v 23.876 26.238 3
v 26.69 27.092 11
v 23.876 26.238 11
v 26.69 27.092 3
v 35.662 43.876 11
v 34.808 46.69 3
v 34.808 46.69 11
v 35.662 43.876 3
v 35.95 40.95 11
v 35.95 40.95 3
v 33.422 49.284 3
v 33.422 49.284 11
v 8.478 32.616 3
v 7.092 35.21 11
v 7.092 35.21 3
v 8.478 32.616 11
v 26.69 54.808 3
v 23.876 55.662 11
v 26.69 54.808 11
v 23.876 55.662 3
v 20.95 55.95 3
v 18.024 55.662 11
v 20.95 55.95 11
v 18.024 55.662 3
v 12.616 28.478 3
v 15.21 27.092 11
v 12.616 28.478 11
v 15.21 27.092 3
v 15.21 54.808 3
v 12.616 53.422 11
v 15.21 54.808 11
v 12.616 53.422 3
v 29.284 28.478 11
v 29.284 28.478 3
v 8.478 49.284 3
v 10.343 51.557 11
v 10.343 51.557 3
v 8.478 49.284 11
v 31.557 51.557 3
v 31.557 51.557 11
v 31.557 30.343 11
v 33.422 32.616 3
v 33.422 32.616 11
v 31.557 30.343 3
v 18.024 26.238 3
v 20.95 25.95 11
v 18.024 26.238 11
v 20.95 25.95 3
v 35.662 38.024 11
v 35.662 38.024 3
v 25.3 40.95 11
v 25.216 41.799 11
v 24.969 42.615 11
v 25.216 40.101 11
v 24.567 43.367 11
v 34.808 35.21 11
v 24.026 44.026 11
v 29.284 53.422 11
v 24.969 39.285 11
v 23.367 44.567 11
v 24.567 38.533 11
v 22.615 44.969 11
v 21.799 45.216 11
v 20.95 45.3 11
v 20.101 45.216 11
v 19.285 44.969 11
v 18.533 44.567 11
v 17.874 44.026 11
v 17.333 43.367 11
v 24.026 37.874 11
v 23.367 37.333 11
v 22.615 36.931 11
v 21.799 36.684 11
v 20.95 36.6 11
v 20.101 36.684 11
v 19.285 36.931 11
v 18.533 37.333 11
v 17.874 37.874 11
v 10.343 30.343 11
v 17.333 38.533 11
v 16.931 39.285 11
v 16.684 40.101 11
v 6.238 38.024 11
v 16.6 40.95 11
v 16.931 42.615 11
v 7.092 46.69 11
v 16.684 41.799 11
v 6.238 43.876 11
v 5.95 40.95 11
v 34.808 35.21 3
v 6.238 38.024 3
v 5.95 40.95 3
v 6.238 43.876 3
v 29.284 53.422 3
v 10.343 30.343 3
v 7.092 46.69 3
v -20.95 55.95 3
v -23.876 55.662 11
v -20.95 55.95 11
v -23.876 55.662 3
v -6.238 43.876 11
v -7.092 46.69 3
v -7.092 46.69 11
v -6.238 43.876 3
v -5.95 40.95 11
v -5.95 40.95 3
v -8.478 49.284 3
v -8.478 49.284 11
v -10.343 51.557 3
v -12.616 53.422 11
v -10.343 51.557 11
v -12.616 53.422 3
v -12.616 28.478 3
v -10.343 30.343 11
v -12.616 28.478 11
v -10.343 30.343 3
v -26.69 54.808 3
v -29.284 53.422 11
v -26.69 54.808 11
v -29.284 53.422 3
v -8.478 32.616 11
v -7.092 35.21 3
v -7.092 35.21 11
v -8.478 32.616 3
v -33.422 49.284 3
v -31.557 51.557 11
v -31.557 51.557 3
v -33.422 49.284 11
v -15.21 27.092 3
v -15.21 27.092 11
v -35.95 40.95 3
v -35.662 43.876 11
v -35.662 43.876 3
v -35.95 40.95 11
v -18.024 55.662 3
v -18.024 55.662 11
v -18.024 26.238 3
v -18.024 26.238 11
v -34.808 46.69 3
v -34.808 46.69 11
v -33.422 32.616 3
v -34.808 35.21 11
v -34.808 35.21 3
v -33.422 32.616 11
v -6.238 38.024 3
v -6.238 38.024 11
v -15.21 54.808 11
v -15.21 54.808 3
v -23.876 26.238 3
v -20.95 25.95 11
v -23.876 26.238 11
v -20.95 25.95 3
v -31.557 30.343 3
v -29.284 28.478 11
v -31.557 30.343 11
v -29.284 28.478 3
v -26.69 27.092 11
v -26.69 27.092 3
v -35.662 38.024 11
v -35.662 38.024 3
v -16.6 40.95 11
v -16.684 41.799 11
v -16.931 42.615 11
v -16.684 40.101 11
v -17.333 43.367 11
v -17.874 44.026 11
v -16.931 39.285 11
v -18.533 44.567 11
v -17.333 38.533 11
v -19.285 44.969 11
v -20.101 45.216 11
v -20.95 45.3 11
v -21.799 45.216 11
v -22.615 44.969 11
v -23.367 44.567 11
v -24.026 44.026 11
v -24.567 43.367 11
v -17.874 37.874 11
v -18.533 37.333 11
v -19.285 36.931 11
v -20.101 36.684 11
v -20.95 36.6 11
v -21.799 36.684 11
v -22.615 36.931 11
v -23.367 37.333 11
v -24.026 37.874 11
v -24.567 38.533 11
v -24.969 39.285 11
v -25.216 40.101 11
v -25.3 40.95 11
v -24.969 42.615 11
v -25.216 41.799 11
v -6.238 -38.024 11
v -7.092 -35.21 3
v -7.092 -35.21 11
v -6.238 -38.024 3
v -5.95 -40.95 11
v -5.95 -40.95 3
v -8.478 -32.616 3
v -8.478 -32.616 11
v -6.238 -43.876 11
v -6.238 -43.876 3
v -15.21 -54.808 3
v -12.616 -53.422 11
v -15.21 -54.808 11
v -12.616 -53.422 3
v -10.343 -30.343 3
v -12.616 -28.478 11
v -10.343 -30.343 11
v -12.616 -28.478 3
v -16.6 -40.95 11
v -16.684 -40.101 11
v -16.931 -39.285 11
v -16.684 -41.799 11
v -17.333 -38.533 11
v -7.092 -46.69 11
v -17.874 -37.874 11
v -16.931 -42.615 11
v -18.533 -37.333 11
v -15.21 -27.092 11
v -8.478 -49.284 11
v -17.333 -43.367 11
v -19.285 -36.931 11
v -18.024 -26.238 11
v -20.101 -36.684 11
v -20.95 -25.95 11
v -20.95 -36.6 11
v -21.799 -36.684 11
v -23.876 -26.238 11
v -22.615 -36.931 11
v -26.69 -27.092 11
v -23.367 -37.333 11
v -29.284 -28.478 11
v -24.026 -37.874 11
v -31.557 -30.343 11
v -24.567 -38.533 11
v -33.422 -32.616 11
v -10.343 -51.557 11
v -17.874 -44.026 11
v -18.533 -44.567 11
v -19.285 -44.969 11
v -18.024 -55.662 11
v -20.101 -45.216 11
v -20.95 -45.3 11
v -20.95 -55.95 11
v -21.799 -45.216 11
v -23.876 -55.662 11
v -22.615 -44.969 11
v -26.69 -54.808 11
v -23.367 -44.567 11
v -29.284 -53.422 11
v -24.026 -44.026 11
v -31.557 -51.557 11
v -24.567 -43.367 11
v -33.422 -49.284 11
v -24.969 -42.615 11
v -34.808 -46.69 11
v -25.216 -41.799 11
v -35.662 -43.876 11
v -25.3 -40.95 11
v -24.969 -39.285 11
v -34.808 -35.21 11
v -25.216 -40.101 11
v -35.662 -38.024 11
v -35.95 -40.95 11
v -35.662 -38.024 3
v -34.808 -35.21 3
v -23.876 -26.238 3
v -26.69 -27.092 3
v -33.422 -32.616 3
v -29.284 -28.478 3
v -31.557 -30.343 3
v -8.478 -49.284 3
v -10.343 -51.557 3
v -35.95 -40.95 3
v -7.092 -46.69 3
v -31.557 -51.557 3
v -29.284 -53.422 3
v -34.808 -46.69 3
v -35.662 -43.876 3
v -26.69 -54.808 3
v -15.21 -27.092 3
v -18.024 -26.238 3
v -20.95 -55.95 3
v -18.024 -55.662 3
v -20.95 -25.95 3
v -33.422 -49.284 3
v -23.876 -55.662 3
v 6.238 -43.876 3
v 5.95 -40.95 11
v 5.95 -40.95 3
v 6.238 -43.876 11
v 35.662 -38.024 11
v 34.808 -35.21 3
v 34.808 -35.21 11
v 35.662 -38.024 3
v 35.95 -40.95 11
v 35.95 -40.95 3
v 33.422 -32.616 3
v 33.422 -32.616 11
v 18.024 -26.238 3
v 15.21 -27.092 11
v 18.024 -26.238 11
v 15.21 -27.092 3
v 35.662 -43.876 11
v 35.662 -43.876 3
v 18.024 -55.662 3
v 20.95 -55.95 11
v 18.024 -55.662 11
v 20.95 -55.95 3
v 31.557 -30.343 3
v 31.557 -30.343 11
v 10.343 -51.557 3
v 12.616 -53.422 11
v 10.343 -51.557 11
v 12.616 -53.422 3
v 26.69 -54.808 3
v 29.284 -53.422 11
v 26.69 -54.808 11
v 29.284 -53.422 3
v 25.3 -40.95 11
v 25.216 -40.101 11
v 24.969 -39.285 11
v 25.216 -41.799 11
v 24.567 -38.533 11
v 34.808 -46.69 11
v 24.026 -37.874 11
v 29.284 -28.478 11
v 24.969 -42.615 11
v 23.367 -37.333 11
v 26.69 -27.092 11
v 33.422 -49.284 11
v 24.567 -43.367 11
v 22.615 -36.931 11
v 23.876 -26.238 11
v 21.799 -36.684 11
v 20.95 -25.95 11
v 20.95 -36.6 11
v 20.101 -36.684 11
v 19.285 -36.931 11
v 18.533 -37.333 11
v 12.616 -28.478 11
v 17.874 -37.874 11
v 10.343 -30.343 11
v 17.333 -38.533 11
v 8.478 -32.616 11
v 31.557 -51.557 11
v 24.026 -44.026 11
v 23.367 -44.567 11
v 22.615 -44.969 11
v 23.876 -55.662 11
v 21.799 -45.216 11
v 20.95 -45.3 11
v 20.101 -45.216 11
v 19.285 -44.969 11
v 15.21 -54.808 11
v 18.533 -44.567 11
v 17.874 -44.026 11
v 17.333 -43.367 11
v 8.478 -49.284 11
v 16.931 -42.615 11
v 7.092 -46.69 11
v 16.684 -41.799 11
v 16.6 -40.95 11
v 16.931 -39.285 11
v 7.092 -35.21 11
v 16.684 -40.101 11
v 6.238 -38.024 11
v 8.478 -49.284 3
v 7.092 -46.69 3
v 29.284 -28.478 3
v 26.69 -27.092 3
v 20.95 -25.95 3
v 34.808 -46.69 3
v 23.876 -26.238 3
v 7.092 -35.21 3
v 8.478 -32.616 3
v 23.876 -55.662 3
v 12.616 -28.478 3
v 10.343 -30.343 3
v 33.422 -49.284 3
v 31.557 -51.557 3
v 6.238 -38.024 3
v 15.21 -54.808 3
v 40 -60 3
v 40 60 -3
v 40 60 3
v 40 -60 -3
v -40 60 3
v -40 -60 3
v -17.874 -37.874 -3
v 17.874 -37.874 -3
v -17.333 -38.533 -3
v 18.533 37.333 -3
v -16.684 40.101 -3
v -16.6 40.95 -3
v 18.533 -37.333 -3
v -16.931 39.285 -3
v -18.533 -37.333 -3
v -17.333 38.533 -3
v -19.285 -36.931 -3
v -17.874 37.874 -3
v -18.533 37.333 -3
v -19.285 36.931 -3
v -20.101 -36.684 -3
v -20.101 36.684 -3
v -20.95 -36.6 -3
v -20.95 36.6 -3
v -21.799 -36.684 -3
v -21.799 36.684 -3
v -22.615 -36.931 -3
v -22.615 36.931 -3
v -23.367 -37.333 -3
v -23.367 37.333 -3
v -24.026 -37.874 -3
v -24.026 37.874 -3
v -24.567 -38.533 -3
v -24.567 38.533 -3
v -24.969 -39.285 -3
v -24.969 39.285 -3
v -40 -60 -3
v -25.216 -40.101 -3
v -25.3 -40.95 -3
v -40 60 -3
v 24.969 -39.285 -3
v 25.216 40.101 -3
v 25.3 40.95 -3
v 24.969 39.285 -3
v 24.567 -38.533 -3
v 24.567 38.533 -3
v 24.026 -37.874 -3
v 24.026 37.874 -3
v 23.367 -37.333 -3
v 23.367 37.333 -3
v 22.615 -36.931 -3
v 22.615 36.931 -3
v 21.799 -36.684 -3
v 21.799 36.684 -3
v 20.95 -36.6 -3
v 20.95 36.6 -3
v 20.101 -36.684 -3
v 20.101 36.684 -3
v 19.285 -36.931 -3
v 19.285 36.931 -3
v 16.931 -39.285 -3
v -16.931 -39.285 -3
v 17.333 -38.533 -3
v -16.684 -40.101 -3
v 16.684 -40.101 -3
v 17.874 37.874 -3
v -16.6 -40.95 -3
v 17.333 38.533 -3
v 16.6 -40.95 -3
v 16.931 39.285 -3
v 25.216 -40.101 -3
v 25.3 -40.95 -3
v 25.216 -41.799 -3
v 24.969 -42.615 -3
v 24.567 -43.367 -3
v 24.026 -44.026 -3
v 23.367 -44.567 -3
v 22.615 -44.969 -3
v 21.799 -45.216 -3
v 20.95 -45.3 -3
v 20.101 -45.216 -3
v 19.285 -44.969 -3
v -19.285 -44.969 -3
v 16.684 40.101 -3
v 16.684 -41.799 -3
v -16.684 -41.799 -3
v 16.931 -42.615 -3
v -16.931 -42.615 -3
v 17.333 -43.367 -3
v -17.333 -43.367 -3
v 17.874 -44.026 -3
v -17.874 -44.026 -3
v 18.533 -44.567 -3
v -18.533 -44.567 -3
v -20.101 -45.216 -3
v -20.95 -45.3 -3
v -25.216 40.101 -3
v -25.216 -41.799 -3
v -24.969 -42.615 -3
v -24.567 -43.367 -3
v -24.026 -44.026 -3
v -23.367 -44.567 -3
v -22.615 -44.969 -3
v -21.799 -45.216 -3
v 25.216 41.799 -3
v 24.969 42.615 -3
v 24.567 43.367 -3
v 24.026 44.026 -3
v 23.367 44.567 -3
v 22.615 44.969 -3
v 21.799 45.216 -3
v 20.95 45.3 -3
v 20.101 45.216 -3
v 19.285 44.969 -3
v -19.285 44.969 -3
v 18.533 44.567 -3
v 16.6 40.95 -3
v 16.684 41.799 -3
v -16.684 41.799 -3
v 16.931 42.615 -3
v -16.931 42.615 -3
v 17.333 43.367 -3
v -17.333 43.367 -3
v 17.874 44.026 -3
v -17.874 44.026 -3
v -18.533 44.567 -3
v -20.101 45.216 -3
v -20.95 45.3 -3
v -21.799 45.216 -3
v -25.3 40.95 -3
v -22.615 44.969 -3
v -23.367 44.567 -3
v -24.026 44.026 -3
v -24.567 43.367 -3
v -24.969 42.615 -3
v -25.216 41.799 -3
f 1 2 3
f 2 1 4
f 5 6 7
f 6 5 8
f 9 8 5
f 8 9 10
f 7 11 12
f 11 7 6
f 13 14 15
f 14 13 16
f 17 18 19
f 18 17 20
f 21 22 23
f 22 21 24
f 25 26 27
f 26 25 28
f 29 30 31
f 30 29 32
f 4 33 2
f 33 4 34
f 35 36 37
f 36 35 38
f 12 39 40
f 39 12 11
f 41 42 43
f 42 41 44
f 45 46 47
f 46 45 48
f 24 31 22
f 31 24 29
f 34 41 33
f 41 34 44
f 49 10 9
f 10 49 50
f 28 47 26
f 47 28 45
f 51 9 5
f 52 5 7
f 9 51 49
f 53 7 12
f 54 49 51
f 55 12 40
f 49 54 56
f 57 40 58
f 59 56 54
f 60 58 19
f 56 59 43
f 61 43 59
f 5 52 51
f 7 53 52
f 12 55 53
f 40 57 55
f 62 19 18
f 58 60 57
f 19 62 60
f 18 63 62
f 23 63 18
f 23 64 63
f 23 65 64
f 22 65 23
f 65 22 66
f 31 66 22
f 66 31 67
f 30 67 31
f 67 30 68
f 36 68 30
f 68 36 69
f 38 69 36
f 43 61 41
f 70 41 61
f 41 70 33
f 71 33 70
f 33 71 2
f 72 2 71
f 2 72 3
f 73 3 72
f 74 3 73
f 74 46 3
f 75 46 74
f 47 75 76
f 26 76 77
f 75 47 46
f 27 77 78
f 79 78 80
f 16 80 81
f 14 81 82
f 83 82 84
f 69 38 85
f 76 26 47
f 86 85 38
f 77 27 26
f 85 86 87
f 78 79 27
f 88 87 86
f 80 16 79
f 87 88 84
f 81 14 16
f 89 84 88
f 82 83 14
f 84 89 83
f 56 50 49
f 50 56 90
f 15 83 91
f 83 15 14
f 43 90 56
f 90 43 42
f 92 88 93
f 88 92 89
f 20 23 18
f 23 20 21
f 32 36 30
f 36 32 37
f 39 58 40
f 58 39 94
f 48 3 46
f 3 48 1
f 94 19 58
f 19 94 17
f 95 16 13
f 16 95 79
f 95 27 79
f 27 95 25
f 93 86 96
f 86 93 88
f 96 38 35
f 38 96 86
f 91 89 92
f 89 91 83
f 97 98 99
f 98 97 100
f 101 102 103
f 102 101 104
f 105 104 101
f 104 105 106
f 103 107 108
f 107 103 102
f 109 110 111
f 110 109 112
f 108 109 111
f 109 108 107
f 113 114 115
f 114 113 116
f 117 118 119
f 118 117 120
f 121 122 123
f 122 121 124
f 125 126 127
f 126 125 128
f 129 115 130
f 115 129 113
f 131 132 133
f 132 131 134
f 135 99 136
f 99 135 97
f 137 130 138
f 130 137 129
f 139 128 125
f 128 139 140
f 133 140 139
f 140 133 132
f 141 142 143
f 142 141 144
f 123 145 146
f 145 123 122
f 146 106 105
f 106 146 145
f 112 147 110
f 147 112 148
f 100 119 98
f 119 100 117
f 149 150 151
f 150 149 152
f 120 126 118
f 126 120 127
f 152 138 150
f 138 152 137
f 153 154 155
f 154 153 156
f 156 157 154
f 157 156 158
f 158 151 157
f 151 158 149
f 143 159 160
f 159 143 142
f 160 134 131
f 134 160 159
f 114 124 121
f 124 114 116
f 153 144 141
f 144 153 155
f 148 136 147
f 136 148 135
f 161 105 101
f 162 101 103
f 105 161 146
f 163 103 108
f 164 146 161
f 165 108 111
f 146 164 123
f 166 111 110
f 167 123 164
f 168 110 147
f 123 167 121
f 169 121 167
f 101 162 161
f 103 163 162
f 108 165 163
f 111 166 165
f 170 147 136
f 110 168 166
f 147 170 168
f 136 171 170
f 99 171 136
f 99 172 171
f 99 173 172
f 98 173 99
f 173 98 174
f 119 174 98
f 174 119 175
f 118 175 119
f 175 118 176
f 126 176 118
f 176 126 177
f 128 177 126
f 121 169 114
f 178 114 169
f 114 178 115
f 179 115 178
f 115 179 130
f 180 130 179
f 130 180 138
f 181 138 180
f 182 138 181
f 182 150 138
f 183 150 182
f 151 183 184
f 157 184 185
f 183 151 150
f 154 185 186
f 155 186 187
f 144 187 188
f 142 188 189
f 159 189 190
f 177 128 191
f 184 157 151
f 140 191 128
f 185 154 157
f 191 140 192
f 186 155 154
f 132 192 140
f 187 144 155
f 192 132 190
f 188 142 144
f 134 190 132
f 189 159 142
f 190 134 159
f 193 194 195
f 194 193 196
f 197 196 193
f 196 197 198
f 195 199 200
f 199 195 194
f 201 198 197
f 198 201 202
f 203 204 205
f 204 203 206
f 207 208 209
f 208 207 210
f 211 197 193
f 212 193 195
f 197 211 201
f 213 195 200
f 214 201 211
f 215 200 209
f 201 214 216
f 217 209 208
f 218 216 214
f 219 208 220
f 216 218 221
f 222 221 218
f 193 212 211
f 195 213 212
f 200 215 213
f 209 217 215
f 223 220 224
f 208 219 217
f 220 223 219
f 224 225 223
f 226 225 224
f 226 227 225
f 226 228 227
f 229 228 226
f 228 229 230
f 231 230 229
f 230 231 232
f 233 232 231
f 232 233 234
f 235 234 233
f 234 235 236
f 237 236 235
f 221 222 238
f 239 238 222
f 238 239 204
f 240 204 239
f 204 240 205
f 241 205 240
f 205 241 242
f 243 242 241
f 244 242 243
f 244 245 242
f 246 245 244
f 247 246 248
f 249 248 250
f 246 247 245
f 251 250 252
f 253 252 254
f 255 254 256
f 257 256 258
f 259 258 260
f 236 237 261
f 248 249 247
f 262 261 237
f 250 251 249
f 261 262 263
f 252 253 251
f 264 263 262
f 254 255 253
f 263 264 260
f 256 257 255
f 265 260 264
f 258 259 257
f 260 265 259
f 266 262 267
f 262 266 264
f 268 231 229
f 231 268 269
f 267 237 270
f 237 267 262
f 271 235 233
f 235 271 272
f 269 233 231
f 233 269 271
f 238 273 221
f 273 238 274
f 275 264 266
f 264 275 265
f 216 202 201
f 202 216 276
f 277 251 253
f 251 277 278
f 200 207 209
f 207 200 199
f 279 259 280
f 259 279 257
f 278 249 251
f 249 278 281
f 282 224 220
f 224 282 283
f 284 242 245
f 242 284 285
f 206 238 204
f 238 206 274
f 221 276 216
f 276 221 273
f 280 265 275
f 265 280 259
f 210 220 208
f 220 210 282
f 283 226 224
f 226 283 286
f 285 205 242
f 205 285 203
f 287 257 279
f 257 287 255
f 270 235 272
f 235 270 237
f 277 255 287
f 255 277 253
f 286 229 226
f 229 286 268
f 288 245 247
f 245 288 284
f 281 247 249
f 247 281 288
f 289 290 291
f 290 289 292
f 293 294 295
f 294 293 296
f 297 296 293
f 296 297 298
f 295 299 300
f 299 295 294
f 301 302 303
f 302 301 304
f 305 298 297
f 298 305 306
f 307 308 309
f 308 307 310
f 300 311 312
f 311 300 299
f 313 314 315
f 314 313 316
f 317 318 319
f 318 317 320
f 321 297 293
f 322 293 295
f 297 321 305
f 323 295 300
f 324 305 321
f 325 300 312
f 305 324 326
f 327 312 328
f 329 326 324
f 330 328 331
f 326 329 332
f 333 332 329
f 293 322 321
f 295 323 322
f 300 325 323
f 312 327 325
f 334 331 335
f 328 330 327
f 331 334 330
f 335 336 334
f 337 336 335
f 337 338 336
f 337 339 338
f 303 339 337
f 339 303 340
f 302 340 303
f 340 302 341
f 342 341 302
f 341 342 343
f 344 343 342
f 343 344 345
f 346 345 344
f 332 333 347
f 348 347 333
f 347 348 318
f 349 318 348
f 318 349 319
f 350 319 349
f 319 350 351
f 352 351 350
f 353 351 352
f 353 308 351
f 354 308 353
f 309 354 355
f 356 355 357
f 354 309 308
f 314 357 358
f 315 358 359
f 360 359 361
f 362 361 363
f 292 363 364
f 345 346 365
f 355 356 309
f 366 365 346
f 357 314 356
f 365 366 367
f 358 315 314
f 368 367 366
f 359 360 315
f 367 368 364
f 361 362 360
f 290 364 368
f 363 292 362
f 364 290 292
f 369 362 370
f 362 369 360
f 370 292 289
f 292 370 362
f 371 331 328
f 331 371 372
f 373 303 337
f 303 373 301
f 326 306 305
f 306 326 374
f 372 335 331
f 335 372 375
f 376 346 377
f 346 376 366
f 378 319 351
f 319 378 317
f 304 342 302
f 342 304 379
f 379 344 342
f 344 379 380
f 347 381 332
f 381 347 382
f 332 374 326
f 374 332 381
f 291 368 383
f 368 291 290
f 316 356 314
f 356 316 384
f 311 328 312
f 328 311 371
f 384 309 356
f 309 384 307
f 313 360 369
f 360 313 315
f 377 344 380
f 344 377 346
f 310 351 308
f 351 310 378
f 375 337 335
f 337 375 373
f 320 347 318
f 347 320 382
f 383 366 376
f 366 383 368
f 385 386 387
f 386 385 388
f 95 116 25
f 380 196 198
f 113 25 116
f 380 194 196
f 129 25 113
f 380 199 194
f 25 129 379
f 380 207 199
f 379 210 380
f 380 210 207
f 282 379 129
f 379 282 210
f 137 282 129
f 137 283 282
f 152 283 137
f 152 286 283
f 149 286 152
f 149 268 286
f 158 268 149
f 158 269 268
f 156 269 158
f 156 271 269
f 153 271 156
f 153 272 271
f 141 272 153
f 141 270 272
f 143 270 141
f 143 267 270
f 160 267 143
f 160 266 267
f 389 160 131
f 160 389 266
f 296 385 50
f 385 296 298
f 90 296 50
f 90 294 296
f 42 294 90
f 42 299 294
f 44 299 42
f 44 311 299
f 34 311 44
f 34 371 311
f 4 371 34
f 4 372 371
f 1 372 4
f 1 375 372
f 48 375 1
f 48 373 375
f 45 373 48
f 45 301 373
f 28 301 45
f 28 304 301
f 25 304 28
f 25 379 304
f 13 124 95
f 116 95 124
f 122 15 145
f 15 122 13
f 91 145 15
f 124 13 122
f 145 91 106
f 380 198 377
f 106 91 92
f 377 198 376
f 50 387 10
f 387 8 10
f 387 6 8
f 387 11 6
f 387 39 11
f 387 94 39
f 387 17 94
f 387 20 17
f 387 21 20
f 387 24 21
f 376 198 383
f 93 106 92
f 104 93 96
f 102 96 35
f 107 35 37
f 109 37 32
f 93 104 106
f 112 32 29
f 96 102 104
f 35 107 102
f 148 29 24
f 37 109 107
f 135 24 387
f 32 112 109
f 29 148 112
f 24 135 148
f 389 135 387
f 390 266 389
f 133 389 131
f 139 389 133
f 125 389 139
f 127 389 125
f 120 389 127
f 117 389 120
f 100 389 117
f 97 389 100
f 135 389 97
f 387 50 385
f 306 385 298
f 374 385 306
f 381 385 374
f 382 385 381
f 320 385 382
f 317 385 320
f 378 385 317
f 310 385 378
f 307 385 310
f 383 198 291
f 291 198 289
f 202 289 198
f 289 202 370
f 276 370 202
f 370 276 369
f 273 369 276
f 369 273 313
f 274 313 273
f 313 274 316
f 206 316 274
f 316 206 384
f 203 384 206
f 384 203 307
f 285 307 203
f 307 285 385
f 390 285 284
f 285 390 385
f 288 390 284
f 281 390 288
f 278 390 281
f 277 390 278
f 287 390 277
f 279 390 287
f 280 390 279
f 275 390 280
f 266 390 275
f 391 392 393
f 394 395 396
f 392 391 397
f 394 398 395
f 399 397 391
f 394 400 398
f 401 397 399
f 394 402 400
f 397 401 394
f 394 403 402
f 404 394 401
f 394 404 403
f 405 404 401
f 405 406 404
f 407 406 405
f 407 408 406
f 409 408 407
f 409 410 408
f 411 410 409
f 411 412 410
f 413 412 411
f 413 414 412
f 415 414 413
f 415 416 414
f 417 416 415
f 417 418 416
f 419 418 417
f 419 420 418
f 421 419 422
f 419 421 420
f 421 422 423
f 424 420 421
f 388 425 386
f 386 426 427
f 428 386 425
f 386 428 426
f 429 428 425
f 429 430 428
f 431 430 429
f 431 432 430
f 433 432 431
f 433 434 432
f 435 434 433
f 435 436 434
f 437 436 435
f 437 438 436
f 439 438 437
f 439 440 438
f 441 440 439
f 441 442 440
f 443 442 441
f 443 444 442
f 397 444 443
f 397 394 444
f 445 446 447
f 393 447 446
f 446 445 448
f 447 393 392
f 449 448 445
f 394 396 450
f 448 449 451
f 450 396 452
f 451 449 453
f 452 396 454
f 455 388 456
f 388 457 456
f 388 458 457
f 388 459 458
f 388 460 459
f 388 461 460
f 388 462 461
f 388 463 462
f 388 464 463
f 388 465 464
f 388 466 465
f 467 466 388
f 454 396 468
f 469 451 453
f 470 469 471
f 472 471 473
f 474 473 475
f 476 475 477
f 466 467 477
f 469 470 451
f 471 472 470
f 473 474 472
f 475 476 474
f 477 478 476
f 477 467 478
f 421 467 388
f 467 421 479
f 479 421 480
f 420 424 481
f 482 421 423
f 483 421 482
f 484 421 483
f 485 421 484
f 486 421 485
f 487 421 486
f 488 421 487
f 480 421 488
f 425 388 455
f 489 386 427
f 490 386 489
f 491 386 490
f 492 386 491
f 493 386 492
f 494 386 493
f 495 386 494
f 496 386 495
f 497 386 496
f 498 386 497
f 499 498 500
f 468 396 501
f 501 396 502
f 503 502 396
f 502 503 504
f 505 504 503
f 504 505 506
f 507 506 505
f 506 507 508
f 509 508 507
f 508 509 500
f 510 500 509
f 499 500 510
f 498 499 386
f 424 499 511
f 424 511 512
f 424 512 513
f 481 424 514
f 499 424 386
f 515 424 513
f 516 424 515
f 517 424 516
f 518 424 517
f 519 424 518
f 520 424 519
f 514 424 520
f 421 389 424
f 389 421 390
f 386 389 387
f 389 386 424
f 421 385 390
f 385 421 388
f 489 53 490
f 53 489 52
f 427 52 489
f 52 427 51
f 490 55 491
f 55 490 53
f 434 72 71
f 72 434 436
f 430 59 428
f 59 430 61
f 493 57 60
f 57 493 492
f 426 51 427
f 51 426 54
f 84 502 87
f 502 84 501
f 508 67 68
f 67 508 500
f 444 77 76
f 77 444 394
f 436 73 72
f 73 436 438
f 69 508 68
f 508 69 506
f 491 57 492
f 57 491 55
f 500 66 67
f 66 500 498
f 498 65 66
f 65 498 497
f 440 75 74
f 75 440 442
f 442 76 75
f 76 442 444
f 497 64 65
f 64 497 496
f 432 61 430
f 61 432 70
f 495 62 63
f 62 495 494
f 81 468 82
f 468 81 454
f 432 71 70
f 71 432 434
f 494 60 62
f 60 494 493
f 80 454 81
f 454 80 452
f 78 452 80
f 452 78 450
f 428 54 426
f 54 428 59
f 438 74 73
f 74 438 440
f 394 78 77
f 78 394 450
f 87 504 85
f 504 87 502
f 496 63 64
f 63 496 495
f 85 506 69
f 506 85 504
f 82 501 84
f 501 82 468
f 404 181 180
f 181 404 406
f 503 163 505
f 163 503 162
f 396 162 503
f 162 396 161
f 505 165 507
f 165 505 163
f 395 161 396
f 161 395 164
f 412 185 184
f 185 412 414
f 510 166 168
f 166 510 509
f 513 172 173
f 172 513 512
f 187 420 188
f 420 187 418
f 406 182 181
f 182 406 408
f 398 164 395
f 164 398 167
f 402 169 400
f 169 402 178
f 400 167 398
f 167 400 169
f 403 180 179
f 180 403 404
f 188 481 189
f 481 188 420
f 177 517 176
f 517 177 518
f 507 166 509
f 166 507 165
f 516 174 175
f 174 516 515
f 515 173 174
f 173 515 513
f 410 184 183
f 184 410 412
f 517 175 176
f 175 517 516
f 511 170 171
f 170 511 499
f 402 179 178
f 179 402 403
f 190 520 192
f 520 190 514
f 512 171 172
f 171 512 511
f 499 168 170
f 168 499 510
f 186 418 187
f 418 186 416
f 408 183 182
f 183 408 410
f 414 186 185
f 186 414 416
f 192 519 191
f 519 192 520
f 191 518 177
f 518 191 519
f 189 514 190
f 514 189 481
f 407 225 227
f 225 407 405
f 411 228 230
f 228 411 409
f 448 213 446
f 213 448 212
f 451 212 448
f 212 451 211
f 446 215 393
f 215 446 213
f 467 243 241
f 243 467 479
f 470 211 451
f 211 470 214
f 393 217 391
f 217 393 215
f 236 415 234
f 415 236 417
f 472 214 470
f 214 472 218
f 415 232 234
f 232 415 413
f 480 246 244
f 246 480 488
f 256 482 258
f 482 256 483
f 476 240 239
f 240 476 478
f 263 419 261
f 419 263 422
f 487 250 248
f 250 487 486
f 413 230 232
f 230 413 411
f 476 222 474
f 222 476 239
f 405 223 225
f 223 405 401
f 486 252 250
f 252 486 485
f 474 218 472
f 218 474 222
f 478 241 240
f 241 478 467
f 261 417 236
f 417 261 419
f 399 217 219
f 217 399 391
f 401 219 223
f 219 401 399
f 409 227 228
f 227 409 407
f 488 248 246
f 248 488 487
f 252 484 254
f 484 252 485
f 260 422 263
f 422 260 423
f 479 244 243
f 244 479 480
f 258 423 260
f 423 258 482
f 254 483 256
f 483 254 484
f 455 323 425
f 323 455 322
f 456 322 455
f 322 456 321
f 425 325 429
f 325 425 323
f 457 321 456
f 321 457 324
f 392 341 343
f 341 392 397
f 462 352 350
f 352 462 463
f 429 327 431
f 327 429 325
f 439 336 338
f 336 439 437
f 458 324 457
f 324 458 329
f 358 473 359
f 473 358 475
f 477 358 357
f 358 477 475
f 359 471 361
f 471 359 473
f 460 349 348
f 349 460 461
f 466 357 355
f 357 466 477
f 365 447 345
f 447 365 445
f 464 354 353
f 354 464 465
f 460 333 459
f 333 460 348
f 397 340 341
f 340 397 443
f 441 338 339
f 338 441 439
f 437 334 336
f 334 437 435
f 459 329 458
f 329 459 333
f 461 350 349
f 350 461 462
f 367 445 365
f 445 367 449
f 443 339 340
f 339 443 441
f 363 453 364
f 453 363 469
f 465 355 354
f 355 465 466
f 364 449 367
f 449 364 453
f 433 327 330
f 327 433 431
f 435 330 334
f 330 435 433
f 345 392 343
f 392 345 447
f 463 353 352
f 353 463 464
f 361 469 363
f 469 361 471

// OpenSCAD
$fn = 32;

// ----------------------------------------------------------------------
// Anchor pads 80 x 120 x 14
// four corner bosses with anchor holes
// ----------------------------------------------------------------------

// --- parameters (mm) ---
plate = [80, 120, 6];   // base plate size (x, y, z)
pads = 4;               // boss count, one per corner
edge = 19.05;           // boss centre offset from the plate edge
boss_d = 30;            // boss diameter
boss_h = 8;             // boss height above the base plate
bore_d = 8.4;           // nominal hole diameter from the drawing
print_allowance = 0.3;  // clearance added for printing

// --- derived feature positions (mm) ---
hole_d = bore_d + print_allowance;  // = 8.7   hole diameter as printed
height = plate[2] + boss_h;         // = 14   overall height of the part
corner_x = plate[0] / 2 - edge;     // = 20.95   boss centre X
corner_y = plate[1] / 2 - edge;     // = 40.95   boss centre Y
feature_centers = [
  [corner_x, corner_y],
  [-corner_x, corner_y],
  [-corner_x, -corner_y],
  [corner_x, -corner_y]
];   // boss centres, anchor holes are drilled there

// base plate, four bosses standing on it, anchor holes all the way through
difference() {
  union() {
    cube(plate, center = true);
    for (centre = feature_centers)
      translate([centre[0], centre[1], plate[2] / 2 - 1])
        cylinder(d = boss_d, h = boss_h + 1);
  }
  for (centre = feature_centers)
    translate([centre[0], centre[1], -height])
      cylinder(d = hole_d, h = 2 * height + 2);  // through boss and plate
}
